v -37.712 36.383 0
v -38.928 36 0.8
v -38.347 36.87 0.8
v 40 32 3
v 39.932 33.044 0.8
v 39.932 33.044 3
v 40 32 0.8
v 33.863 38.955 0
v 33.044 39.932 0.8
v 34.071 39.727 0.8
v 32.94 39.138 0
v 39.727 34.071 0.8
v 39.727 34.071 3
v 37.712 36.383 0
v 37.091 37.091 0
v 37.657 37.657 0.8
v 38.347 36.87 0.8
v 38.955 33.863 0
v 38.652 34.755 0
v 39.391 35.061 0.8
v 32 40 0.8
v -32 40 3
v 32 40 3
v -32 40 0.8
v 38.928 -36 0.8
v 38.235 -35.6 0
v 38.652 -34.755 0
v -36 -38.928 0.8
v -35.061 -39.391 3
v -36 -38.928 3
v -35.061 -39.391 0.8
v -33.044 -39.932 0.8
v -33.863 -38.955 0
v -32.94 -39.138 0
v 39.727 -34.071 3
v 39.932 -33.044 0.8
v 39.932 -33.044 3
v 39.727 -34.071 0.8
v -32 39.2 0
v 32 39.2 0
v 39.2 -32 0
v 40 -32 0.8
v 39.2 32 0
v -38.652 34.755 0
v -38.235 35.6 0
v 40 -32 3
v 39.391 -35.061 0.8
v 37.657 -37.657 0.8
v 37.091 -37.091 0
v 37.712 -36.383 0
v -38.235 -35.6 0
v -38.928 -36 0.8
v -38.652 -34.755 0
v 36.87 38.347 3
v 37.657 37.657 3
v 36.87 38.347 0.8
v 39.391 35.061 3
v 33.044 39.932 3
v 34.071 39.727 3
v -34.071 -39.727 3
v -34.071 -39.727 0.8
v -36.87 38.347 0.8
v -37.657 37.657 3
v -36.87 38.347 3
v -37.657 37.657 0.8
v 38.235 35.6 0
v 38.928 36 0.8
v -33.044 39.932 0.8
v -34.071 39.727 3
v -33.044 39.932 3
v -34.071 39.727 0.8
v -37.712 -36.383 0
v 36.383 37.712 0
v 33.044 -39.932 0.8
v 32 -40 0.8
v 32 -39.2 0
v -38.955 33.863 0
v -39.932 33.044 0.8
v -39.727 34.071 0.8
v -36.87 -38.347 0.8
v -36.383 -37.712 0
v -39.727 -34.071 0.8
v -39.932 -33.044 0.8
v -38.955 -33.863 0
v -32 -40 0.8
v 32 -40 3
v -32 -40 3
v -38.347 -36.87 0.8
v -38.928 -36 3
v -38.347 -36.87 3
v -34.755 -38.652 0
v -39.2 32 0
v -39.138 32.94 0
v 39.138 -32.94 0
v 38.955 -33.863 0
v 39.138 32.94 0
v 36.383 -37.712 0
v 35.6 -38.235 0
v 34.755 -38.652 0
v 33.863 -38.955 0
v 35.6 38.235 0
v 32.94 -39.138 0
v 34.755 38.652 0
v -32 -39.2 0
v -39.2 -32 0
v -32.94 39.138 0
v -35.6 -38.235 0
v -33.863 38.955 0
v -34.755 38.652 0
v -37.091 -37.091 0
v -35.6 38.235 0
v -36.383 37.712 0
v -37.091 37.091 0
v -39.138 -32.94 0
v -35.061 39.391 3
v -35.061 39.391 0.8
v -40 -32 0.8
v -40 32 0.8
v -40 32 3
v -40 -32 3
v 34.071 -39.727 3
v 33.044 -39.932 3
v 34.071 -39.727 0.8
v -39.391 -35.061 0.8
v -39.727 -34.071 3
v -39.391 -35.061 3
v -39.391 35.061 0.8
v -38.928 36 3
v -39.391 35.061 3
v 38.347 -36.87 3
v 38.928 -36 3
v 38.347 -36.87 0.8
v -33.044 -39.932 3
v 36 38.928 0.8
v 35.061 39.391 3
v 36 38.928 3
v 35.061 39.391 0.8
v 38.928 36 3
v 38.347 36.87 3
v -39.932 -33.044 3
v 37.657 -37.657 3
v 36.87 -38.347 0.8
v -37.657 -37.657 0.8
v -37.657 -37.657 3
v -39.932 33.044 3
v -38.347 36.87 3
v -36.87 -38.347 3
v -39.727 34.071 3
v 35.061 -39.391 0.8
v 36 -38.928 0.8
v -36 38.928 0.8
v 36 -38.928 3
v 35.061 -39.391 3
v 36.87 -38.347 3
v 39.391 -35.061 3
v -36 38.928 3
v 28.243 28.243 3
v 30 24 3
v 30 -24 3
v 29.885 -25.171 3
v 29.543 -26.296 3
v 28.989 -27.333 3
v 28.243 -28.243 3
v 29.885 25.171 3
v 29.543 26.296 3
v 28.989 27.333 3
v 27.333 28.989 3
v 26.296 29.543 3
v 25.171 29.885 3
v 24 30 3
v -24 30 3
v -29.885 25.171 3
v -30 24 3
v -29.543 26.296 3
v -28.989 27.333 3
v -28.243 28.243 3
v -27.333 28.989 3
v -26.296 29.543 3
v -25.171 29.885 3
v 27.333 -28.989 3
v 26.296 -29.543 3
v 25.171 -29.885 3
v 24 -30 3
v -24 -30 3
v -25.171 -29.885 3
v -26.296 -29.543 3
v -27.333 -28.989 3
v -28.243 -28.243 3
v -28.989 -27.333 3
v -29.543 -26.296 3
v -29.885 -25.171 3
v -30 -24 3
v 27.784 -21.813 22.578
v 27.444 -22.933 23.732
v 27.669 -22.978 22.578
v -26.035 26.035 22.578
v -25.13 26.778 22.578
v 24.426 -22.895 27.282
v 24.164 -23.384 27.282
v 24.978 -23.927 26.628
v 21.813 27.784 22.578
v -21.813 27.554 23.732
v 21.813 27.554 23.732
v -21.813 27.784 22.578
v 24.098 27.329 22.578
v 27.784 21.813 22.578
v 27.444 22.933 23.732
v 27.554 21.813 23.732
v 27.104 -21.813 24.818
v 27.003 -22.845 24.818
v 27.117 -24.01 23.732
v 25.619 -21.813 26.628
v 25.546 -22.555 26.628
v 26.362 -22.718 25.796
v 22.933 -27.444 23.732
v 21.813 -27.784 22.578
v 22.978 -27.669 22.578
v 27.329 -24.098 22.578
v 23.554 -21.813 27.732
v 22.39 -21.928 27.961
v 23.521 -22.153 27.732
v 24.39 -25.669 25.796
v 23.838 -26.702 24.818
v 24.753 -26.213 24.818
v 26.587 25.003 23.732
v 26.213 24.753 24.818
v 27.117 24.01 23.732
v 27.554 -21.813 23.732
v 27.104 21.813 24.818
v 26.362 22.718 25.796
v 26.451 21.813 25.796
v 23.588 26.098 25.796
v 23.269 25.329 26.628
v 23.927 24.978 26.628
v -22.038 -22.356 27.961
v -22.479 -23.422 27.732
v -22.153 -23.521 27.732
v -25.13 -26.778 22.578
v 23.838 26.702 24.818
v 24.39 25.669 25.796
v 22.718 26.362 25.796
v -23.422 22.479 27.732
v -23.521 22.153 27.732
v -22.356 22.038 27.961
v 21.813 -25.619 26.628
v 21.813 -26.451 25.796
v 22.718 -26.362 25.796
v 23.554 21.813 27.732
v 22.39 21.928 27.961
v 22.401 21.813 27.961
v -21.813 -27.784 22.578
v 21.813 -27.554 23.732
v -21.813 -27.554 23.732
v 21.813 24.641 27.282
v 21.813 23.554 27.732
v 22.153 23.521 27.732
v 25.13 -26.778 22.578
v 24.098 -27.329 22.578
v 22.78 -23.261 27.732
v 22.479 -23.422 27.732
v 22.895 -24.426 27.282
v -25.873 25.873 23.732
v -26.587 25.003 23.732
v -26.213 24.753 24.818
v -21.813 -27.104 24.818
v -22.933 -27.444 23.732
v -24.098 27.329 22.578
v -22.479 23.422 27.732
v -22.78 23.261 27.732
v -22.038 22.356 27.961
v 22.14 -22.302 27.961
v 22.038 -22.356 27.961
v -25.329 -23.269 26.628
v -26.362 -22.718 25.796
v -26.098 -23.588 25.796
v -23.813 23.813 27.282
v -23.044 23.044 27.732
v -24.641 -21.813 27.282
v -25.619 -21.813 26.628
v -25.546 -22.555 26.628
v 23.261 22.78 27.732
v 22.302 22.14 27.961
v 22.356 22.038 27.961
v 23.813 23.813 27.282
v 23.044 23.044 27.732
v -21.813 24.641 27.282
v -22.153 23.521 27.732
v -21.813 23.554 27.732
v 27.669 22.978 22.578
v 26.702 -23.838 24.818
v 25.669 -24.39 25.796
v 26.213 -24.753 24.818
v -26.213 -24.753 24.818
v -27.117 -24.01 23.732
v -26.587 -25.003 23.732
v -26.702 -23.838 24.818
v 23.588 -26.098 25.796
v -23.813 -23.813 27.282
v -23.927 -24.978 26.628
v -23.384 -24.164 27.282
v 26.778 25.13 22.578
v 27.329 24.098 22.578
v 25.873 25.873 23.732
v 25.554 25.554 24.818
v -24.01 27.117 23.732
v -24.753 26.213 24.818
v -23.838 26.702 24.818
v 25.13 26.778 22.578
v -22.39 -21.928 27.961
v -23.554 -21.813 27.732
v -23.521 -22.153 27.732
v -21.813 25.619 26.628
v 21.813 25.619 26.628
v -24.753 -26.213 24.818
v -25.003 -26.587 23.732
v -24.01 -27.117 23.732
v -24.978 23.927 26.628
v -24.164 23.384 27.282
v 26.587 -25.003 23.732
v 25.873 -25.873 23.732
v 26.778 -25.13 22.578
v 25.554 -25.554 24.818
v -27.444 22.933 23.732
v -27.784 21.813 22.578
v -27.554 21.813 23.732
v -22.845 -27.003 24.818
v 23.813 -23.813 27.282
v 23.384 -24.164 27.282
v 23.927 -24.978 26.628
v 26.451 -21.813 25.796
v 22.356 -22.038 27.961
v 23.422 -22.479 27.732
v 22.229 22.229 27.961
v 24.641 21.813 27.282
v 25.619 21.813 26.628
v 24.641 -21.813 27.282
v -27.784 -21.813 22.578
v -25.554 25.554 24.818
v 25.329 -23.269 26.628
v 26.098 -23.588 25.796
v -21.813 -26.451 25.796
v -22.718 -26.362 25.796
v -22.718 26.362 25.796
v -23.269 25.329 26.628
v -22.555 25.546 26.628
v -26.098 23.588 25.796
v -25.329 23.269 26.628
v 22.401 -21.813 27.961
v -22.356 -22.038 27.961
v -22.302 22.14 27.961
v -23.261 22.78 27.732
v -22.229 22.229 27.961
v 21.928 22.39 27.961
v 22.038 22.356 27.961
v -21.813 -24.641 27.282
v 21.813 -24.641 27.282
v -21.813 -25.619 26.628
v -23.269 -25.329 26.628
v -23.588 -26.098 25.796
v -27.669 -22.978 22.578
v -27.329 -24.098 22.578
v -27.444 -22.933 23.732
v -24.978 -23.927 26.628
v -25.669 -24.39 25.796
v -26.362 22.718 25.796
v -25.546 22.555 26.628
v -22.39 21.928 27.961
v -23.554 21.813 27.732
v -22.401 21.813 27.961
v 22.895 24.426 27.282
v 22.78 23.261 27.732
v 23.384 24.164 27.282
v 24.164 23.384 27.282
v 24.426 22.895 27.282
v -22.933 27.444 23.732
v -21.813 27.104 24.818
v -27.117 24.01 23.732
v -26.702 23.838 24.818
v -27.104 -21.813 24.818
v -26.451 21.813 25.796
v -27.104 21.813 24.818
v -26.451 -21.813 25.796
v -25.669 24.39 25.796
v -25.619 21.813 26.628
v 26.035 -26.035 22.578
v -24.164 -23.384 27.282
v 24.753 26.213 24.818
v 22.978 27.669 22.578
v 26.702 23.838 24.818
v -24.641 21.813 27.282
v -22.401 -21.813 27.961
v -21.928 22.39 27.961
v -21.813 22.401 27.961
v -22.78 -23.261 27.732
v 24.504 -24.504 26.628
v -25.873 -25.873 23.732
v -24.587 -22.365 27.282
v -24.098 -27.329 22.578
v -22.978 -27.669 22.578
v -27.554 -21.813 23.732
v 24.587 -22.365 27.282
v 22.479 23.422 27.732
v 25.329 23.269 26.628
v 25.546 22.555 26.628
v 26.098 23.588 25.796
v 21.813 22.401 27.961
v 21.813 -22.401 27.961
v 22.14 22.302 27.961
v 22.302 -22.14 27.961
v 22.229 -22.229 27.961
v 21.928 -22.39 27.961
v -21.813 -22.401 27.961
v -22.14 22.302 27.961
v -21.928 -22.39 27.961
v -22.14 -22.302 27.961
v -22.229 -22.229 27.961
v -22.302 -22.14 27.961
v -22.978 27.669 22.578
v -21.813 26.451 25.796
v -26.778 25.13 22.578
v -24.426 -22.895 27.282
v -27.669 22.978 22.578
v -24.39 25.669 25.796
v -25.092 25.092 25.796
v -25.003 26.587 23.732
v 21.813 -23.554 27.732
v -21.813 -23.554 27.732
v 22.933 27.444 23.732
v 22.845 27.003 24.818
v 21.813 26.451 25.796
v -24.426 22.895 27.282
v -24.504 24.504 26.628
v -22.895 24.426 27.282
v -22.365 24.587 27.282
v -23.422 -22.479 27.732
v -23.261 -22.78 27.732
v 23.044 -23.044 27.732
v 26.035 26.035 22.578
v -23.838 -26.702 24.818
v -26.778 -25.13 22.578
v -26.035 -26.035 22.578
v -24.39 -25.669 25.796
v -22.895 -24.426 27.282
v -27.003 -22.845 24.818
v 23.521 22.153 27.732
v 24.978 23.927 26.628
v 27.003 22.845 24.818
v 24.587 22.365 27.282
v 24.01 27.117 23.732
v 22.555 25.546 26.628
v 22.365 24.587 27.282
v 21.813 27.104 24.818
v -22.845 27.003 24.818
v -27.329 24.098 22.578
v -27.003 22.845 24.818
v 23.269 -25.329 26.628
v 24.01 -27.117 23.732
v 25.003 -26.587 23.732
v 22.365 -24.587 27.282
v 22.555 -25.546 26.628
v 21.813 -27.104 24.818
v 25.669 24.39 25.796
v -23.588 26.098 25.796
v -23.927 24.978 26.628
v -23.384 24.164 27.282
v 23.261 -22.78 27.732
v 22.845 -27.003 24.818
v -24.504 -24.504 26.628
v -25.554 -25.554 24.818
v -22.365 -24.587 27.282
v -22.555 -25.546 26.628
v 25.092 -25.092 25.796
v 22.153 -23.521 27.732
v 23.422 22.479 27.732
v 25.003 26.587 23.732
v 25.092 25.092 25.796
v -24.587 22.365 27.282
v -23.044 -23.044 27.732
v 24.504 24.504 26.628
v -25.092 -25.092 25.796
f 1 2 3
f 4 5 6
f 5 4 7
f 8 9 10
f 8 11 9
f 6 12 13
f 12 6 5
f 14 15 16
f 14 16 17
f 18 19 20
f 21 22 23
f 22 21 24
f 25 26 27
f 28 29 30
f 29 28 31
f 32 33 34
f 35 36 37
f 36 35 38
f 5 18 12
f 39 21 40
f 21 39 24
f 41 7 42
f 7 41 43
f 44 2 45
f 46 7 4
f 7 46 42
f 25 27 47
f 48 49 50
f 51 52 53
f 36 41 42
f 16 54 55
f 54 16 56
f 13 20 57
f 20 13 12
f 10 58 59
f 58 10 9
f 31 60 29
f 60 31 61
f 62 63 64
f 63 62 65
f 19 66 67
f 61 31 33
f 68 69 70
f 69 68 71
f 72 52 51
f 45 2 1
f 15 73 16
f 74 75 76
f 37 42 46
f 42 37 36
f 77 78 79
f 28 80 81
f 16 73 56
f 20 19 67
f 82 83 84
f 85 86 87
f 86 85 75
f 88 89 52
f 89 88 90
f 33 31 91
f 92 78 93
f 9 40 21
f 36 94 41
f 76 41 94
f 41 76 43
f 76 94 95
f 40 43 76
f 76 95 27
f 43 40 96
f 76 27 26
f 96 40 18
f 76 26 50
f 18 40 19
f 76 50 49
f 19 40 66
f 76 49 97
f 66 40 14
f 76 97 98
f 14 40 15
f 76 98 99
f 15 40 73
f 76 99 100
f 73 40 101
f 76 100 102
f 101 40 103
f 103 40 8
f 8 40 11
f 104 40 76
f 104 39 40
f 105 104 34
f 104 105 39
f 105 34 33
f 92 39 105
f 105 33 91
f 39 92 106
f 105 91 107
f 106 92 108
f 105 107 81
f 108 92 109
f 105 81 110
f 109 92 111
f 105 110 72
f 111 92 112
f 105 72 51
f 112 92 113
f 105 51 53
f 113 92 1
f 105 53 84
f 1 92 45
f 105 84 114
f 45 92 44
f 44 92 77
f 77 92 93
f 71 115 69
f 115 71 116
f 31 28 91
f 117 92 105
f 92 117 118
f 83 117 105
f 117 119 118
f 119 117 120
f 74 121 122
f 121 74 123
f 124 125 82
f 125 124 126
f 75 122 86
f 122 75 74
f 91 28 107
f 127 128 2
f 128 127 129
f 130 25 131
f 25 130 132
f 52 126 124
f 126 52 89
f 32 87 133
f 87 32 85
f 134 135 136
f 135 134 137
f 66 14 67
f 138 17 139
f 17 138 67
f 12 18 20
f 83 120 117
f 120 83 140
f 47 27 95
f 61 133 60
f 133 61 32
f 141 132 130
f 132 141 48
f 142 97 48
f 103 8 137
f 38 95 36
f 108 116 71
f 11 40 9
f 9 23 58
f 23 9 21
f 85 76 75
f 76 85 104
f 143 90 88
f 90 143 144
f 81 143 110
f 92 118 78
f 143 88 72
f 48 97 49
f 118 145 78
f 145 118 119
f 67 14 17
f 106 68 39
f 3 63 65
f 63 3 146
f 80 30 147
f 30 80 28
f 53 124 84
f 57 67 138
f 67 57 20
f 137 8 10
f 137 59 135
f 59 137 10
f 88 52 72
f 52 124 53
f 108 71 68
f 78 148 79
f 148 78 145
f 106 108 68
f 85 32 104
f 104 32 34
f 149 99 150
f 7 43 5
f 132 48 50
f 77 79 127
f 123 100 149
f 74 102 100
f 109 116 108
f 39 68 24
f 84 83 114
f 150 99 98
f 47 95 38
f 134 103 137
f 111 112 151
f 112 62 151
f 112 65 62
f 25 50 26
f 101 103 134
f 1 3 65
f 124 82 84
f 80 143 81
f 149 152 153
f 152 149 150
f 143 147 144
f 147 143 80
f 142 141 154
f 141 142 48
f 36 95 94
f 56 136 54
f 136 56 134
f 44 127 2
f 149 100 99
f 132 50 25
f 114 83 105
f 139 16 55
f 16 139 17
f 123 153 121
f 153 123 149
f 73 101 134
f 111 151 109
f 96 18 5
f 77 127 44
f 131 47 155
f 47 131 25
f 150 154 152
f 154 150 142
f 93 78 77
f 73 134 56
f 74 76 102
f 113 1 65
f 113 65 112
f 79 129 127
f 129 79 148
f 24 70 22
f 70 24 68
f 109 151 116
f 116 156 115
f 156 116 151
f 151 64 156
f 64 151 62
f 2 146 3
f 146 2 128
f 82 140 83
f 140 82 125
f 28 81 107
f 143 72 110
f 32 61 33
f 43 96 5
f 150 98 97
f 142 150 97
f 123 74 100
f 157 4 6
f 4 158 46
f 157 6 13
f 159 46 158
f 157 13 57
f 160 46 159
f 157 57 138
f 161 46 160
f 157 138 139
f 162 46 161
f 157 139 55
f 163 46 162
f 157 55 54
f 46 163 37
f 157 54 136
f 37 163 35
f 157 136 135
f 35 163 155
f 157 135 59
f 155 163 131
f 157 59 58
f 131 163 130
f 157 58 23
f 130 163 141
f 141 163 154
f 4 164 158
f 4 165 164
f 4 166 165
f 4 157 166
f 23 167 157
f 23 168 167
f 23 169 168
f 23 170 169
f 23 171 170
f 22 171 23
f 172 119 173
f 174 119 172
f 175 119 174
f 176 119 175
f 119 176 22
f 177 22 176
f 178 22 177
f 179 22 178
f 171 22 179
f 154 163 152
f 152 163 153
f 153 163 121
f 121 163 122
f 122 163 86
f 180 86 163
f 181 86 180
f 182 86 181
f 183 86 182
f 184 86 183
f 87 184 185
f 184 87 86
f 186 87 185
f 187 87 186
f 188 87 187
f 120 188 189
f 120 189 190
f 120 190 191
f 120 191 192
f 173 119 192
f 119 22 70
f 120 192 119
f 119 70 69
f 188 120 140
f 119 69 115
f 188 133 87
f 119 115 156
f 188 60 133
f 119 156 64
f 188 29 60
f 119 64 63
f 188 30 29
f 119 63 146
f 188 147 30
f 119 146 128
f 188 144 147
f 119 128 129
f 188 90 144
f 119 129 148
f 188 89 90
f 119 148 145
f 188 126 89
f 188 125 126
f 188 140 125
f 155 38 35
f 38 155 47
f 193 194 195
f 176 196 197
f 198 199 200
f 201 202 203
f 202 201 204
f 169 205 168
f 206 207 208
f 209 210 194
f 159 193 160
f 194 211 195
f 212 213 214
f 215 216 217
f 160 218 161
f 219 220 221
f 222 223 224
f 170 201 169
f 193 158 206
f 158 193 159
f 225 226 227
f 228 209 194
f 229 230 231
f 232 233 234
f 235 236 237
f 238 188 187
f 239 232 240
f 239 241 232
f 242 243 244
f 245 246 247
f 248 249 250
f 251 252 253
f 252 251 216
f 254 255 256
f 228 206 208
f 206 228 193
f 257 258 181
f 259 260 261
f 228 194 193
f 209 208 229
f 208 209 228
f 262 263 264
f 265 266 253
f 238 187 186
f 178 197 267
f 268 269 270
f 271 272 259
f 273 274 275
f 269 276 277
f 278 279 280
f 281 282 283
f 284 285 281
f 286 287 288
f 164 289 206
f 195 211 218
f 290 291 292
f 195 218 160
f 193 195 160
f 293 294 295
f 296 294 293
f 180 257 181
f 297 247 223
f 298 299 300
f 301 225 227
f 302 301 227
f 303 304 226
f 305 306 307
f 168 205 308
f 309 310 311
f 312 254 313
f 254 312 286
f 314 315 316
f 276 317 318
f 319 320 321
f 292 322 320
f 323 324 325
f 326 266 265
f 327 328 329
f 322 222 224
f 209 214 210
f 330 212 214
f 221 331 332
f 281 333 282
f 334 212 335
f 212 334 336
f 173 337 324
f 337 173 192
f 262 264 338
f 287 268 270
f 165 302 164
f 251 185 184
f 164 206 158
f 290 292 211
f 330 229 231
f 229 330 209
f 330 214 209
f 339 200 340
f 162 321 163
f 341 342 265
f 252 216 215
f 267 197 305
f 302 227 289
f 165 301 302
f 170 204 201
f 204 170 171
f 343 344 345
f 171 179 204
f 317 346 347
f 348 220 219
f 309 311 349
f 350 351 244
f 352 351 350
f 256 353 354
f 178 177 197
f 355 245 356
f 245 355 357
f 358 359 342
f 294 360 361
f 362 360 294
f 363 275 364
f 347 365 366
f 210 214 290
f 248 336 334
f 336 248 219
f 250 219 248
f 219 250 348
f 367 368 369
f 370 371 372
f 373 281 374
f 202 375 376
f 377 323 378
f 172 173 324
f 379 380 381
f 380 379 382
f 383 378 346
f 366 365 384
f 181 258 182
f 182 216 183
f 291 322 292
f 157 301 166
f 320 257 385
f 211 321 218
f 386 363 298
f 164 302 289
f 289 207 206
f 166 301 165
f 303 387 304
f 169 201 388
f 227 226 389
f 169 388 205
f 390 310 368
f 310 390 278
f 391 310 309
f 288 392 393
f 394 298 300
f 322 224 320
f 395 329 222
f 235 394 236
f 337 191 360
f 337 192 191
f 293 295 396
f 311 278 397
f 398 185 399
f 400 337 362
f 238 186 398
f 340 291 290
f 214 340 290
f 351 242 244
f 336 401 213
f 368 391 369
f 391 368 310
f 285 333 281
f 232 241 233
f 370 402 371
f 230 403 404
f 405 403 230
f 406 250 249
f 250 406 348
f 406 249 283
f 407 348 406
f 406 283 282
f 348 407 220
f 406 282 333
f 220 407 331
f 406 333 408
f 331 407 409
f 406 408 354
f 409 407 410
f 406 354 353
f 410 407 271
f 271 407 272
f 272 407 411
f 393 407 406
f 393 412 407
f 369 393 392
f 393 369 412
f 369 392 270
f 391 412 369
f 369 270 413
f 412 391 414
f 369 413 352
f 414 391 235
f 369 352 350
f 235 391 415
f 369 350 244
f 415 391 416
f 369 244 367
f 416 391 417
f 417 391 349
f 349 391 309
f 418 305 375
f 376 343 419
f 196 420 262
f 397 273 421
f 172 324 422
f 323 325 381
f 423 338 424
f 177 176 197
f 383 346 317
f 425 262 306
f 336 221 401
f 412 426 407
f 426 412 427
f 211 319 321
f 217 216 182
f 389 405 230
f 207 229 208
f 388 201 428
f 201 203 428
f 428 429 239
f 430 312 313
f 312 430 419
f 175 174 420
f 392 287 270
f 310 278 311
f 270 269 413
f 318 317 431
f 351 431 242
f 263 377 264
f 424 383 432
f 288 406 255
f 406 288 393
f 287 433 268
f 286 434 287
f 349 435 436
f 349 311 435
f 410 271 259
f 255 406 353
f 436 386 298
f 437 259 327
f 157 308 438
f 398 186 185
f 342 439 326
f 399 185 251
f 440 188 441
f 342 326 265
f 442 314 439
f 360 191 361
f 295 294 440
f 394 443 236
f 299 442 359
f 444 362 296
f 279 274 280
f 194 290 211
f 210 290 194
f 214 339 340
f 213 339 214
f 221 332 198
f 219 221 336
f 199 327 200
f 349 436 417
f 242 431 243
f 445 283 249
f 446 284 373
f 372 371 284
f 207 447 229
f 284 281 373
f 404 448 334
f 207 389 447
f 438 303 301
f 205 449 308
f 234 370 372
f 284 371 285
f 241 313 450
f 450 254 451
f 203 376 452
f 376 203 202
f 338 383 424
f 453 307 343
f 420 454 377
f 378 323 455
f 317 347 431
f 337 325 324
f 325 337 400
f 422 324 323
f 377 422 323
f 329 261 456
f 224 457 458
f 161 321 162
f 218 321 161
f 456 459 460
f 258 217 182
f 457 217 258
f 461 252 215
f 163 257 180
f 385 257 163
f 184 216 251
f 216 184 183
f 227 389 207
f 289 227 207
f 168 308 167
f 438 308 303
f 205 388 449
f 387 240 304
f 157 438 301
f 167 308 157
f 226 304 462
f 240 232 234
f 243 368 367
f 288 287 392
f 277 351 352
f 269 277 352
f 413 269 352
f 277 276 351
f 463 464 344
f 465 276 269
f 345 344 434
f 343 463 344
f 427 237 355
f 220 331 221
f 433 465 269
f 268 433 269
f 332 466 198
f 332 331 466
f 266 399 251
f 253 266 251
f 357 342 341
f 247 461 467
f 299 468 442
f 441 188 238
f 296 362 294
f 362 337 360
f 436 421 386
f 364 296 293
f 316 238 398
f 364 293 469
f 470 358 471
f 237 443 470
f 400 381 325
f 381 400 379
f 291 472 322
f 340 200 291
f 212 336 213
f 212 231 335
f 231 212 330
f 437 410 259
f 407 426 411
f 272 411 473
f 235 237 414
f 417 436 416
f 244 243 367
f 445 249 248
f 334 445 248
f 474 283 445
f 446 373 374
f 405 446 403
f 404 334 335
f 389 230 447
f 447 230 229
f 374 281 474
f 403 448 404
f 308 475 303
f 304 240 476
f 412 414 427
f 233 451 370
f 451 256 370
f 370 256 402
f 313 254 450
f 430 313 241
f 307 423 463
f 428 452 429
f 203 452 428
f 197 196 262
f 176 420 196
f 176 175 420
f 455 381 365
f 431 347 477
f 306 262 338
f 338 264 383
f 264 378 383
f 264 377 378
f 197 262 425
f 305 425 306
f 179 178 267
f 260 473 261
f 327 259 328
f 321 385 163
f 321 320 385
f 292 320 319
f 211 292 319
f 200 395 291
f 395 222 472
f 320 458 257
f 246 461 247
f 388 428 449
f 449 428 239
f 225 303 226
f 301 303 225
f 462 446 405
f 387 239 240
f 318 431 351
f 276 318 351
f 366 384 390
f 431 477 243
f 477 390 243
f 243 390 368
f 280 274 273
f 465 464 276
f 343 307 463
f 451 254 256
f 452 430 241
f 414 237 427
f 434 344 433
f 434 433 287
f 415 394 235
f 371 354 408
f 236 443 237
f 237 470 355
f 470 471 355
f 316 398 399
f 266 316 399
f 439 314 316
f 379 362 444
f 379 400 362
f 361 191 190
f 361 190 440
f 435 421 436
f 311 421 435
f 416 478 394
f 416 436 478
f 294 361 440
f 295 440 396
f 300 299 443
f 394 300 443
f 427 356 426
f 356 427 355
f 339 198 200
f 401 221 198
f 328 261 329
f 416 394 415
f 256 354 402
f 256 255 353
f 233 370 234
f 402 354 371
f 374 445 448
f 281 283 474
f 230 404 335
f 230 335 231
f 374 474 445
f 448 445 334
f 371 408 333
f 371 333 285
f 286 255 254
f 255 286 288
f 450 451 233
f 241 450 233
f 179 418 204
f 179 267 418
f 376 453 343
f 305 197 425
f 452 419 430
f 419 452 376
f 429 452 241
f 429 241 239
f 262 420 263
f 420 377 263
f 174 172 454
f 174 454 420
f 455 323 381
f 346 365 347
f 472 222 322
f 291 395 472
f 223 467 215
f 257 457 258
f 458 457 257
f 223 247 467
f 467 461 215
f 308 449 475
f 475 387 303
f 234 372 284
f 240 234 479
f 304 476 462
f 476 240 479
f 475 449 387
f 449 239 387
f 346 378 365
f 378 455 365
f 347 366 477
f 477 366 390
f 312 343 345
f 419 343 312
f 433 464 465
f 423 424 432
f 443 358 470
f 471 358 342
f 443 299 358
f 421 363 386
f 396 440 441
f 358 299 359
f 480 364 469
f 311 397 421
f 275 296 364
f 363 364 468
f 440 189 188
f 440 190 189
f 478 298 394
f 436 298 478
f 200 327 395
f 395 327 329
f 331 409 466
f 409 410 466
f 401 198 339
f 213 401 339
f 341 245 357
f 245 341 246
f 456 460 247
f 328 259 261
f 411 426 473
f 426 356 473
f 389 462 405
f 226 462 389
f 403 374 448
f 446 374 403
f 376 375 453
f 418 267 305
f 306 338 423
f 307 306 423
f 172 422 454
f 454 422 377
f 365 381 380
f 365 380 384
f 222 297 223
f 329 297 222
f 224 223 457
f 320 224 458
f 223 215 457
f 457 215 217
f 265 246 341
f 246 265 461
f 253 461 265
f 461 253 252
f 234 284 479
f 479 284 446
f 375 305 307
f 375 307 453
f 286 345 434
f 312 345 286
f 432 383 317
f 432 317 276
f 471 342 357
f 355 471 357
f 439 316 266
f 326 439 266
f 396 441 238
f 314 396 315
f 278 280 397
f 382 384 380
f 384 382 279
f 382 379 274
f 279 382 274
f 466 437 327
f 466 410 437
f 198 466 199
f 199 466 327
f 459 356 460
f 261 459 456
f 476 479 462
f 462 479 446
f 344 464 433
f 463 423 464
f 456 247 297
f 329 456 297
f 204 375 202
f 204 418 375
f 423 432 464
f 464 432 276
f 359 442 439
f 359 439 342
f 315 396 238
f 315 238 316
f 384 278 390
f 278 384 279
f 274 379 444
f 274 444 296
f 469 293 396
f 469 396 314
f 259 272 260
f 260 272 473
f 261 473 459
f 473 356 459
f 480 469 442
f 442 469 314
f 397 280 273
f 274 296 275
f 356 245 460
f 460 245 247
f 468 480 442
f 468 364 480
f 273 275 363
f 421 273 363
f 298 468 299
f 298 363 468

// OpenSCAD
/*
    MOLDE DE TERMOFORMADO EN TRES PIEZAS (por ahora con forma de cubo)

    Macho    : placa (reborde) con esquinas redondeadas + cuerpo con la forma de la cesta. Va entero.
    Hembra   : solo el marco. Hueco = placa del macho + holgura. Lleva una canaleta en la cara superior
               y una muesca semicircular en el centro superior por donde sale la rosca de la pieza 3.
    Pieza 3  : lamina del medio. Borde elevado que entra en la canaleta, media rosca arriba
               (entra en la muesca de la hembra) y un hueco pequeno abajo.

    La rosca (diam_rosca) es un valor compartido: la muesca de la hembra y la media rosca de la pieza 3
    usan el mismo diametro.

    Macho y hembra estan centrados en X e Y y apoyados en Z = 0, asi que quedan encastrados tal como
    se exportan. La pieza 3 se exporta lista para imprimir (borde y rosca hacia arriba); para usarla
    se da vuelta sobre el marco.
*/

/* [Cuerpo - forma de la cesta] */

// Ancho (X)
ancho = 60;

// Largo (Y)
largo = 60;

// Alto del cuerpo, sin contar la placa
alto = 25;

// Radio de las aristas del cuerpo
radio_cuerpo = 6;

// Inclinacion de las paredes, en grados (ayuda a desmoldar)
inclinacion = 5;


/* [Encastre - placa del macho] */

// Ancho de la placa alrededor del cuerpo
pestana = 10;

// Espesor de la placa
espesor_placa = 3;

// Radio de las esquinas de la placa (y del hueco del marco)
radio_esquina = 8;

// Redondeo del borde inferior de la placa (facilita encastrar)
bisel = 0.8;

// Espacio entre la placa y el marco
holgura = 1.5;


/* [Marco - hembra] */

// Ancho del borde del marco
pared = 9;

// Alto del marco
alto_marco = 8;


/* [Canaleta de la hembra] */

// Distancia entre el hueco y la canaleta
canal_dist = 2;

// Ancho de la canaleta
canal_ancho = 3;

// Profundidad de la canaleta
canal_prof = 3;


/* [Rosca - compartida por hembra y pieza 3] */

// Diametro exterior de la rosca (la muesca de la hembra usa este mismo valor)
diam_rosca = 8;

// Paso de la rosca
paso_rosca = 2;

// Cuanto sobresale la rosca del marco
saliente_rosca = 8;

// Holgura de la muesca de la hembra respecto de la rosca
holgura_rosca = 0.5;


/* [Pieza 3 - lamina del medio] */

// Espesor de la lamina
espesor_lam = 1.2;

// Alto del borde que sobresale de la lamina
alto_borde = 2.5;

// Holgura del borde dentro de la canaleta (a cada lado)
holgura_canal = 0.3;

// Hueco pequeno de abajo: ancho
hueco_pw = 8;

// Hueco pequeno de abajo: alto
hueco_ph = 2;


/* [Visualizacion] */

// Pieza a exportar
parte = "Macho"; // [Macho, Hembra, Pieza3]


/* =========================
   MEDIDAS
========================= */

placa_w = ancho + 2 * pestana;
placa_d = largo + 2 * pestana;
hueco_w = placa_w + 2 * holgura;
hueco_d = placa_d + 2 * holgura;
radio_hueco = radio_esquina + holgura;

// Pieza 3: su contorno llega hasta la canaleta, menos la holgura
o_out = canal_dist + canal_ancho - holgura_canal;
pl_w = hueco_w + 2 * o_out;
pl_d = hueco_d + 2 * o_out;
r_pl = radio_hueco + o_out;
esp_borde = canal_ancho - 2 * holgura_canal;

// La rosca sale por el centro superior (+Y), hasta pasar el borde del marco
y_rosca0 = pl_d / 2 - esp_borde - 0.5;
y_rosca1 = hueco_d / 2 + pared + saliente_rosca;
largo_rosca = y_rosca1 - y_rosca0;


/* =========================
   GEOMETRIA
========================= */

// Rectangulo redondeado centrado
module rr(w, d, r) {
    r2 = max(0.01, min(r, min(w, d) / 2 - 0.01));
    offset(r = r2, $fn = 48) square([w - 2 * r2, d - 2 * r2], center = true);
}

// ---------- Macho ----------
module placa() {
    hull() {
        linear_extrude(height = 0.01)
            rr(placa_w - 2 * bisel, placa_d - 2 * bisel, radio_esquina - bisel);
        translate([0, 0, bisel])
            linear_extrude(height = espesor_placa - bisel)
                rr(placa_w, placa_d, radio_esquina);
    }
}

module cuerpo() {
    rc = max(0.5, min(radio_cuerpo, alto, ancho / 2 - 0.5, largo / 2 - 0.5));
    d = max(0, min(alto * tan(inclinacion), ancho / 2 - rc - 0.5, largo / 2 - rc - 0.5));
    hull() {
        for (sx = [-1, 1], sy = [-1, 1])
            translate([sx * (ancho / 2 - rc), sy * (largo / 2 - rc), 0])
                cylinder(r = rc, h = 0.01, $fn = 32);
        for (sx = [-1, 1], sy = [-1, 1])
            translate([sx * (ancho / 2 - rc - d), sy * (largo / 2 - rc - d), alto - rc])
                sphere(r = rc, $fn = 32);
    }
}

module macho() {
    union() {
        placa();
        translate([0, 0, espesor_placa - 0.01]) cuerpo();
    }
}

// ---------- Hembra ----------
// Canaleta: anillo hundido en la cara superior, alrededor del hueco
module canaleta() {
    translate([0, 0, alto_marco - canal_prof])
        linear_extrude(height = canal_prof + 1)
            difference() {
                rr(hueco_w + 2 * (canal_dist + canal_ancho), hueco_d + 2 * (canal_dist + canal_ancho),
                   radio_hueco + canal_dist + canal_ancho);
                rr(hueco_w + 2 * canal_dist, hueco_d + 2 * canal_dist, radio_hueco + canal_dist);
            }
}

// Muesca semicircular en el centro superior: por aca sale la rosca de la pieza 3
module muesca_rosca() {
    translate([0, hueco_d / 2 - 1, alto_marco])
        rotate([-90, 0, 0])
            cylinder(r = (diam_rosca + holgura_rosca) / 2, h = pared + 2 + 1, $fn = 40);
}

module hembra() {
    difference() {
        linear_extrude(height = alto_marco)
            rr(hueco_w + 2 * pared, hueco_d + 2 * pared, radio_hueco + pared);
        translate([0, 0, -1])
            linear_extrude(height = alto_marco + 2)
                rr(hueco_w, hueco_d, radio_hueco);
        canaleta();
        muesca_rosca();
    }
}

// ---------- Pieza 3 ----------
// Rosca helicoidal derecha a lo largo de +Z
module rosca_z(L, d_ext, paso) {
    r = d_ext / 2;
    prof = min(1.2, paso * 0.6);
    w = paso * 0.5;
    union() {
        cylinder(r = r - prof, h = L, $fn = 40);
        linear_extrude(height = L, twist = -360 * L / paso, slices = ceil(L / paso * 16), convexity = 10)
            polygon([[r - prof - 0.2, -w / 2], [r, -w * 0.12], [r, w * 0.12], [r - prof - 0.2, w / 2]]);
    }
}

// Media rosca (la mitad superior), con el eje en Y y el plano plano en Z = espesor_lam
module media_rosca() {
    translate([0, y_rosca0, espesor_lam])
        rotate([-90, 0, 0])
            intersection() {
                rosca_z(largo_rosca, diam_rosca, paso_rosca);
                translate([-diam_rosca, -diam_rosca, -1])
                    cube([2 * diam_rosca, diam_rosca, largo_rosca + 2]);
            }
}

module pieza3() {
    union() {
        // lamina con el hueco pequeno de abajo
        linear_extrude(height = espesor_lam, convexity = 10)
            difference() {
                rr(pl_w, pl_d, r_pl);
                translate([0, -(pl_d / 2 - esp_borde - 1 - hueco_ph / 2)])
                    square([hueco_pw, hueco_ph], center = true);
            }
        // borde elevado, a lo largo del contorno
        linear_extrude(height = espesor_lam + alto_borde, convexity = 10)
            difference() {
                rr(pl_w, pl_d, r_pl);
                rr(pl_w - 2 * esp_borde, pl_d - 2 * esp_borde, r_pl - esp_borde);
            }
        // lengueta bajo la rosca (queda apoyada en la cama de impresion)
        translate([-diam_rosca / 2, y_rosca0, 0])
            cube([diam_rosca, largo_rosca, espesor_lam]);
        media_rosca();
    }
}


/* =========================
   RESULTADO
========================= */

if (parte == "Macho") macho();
if (parte == "Hembra") hembra();
if (parte == "Pieza3") pieza3();
